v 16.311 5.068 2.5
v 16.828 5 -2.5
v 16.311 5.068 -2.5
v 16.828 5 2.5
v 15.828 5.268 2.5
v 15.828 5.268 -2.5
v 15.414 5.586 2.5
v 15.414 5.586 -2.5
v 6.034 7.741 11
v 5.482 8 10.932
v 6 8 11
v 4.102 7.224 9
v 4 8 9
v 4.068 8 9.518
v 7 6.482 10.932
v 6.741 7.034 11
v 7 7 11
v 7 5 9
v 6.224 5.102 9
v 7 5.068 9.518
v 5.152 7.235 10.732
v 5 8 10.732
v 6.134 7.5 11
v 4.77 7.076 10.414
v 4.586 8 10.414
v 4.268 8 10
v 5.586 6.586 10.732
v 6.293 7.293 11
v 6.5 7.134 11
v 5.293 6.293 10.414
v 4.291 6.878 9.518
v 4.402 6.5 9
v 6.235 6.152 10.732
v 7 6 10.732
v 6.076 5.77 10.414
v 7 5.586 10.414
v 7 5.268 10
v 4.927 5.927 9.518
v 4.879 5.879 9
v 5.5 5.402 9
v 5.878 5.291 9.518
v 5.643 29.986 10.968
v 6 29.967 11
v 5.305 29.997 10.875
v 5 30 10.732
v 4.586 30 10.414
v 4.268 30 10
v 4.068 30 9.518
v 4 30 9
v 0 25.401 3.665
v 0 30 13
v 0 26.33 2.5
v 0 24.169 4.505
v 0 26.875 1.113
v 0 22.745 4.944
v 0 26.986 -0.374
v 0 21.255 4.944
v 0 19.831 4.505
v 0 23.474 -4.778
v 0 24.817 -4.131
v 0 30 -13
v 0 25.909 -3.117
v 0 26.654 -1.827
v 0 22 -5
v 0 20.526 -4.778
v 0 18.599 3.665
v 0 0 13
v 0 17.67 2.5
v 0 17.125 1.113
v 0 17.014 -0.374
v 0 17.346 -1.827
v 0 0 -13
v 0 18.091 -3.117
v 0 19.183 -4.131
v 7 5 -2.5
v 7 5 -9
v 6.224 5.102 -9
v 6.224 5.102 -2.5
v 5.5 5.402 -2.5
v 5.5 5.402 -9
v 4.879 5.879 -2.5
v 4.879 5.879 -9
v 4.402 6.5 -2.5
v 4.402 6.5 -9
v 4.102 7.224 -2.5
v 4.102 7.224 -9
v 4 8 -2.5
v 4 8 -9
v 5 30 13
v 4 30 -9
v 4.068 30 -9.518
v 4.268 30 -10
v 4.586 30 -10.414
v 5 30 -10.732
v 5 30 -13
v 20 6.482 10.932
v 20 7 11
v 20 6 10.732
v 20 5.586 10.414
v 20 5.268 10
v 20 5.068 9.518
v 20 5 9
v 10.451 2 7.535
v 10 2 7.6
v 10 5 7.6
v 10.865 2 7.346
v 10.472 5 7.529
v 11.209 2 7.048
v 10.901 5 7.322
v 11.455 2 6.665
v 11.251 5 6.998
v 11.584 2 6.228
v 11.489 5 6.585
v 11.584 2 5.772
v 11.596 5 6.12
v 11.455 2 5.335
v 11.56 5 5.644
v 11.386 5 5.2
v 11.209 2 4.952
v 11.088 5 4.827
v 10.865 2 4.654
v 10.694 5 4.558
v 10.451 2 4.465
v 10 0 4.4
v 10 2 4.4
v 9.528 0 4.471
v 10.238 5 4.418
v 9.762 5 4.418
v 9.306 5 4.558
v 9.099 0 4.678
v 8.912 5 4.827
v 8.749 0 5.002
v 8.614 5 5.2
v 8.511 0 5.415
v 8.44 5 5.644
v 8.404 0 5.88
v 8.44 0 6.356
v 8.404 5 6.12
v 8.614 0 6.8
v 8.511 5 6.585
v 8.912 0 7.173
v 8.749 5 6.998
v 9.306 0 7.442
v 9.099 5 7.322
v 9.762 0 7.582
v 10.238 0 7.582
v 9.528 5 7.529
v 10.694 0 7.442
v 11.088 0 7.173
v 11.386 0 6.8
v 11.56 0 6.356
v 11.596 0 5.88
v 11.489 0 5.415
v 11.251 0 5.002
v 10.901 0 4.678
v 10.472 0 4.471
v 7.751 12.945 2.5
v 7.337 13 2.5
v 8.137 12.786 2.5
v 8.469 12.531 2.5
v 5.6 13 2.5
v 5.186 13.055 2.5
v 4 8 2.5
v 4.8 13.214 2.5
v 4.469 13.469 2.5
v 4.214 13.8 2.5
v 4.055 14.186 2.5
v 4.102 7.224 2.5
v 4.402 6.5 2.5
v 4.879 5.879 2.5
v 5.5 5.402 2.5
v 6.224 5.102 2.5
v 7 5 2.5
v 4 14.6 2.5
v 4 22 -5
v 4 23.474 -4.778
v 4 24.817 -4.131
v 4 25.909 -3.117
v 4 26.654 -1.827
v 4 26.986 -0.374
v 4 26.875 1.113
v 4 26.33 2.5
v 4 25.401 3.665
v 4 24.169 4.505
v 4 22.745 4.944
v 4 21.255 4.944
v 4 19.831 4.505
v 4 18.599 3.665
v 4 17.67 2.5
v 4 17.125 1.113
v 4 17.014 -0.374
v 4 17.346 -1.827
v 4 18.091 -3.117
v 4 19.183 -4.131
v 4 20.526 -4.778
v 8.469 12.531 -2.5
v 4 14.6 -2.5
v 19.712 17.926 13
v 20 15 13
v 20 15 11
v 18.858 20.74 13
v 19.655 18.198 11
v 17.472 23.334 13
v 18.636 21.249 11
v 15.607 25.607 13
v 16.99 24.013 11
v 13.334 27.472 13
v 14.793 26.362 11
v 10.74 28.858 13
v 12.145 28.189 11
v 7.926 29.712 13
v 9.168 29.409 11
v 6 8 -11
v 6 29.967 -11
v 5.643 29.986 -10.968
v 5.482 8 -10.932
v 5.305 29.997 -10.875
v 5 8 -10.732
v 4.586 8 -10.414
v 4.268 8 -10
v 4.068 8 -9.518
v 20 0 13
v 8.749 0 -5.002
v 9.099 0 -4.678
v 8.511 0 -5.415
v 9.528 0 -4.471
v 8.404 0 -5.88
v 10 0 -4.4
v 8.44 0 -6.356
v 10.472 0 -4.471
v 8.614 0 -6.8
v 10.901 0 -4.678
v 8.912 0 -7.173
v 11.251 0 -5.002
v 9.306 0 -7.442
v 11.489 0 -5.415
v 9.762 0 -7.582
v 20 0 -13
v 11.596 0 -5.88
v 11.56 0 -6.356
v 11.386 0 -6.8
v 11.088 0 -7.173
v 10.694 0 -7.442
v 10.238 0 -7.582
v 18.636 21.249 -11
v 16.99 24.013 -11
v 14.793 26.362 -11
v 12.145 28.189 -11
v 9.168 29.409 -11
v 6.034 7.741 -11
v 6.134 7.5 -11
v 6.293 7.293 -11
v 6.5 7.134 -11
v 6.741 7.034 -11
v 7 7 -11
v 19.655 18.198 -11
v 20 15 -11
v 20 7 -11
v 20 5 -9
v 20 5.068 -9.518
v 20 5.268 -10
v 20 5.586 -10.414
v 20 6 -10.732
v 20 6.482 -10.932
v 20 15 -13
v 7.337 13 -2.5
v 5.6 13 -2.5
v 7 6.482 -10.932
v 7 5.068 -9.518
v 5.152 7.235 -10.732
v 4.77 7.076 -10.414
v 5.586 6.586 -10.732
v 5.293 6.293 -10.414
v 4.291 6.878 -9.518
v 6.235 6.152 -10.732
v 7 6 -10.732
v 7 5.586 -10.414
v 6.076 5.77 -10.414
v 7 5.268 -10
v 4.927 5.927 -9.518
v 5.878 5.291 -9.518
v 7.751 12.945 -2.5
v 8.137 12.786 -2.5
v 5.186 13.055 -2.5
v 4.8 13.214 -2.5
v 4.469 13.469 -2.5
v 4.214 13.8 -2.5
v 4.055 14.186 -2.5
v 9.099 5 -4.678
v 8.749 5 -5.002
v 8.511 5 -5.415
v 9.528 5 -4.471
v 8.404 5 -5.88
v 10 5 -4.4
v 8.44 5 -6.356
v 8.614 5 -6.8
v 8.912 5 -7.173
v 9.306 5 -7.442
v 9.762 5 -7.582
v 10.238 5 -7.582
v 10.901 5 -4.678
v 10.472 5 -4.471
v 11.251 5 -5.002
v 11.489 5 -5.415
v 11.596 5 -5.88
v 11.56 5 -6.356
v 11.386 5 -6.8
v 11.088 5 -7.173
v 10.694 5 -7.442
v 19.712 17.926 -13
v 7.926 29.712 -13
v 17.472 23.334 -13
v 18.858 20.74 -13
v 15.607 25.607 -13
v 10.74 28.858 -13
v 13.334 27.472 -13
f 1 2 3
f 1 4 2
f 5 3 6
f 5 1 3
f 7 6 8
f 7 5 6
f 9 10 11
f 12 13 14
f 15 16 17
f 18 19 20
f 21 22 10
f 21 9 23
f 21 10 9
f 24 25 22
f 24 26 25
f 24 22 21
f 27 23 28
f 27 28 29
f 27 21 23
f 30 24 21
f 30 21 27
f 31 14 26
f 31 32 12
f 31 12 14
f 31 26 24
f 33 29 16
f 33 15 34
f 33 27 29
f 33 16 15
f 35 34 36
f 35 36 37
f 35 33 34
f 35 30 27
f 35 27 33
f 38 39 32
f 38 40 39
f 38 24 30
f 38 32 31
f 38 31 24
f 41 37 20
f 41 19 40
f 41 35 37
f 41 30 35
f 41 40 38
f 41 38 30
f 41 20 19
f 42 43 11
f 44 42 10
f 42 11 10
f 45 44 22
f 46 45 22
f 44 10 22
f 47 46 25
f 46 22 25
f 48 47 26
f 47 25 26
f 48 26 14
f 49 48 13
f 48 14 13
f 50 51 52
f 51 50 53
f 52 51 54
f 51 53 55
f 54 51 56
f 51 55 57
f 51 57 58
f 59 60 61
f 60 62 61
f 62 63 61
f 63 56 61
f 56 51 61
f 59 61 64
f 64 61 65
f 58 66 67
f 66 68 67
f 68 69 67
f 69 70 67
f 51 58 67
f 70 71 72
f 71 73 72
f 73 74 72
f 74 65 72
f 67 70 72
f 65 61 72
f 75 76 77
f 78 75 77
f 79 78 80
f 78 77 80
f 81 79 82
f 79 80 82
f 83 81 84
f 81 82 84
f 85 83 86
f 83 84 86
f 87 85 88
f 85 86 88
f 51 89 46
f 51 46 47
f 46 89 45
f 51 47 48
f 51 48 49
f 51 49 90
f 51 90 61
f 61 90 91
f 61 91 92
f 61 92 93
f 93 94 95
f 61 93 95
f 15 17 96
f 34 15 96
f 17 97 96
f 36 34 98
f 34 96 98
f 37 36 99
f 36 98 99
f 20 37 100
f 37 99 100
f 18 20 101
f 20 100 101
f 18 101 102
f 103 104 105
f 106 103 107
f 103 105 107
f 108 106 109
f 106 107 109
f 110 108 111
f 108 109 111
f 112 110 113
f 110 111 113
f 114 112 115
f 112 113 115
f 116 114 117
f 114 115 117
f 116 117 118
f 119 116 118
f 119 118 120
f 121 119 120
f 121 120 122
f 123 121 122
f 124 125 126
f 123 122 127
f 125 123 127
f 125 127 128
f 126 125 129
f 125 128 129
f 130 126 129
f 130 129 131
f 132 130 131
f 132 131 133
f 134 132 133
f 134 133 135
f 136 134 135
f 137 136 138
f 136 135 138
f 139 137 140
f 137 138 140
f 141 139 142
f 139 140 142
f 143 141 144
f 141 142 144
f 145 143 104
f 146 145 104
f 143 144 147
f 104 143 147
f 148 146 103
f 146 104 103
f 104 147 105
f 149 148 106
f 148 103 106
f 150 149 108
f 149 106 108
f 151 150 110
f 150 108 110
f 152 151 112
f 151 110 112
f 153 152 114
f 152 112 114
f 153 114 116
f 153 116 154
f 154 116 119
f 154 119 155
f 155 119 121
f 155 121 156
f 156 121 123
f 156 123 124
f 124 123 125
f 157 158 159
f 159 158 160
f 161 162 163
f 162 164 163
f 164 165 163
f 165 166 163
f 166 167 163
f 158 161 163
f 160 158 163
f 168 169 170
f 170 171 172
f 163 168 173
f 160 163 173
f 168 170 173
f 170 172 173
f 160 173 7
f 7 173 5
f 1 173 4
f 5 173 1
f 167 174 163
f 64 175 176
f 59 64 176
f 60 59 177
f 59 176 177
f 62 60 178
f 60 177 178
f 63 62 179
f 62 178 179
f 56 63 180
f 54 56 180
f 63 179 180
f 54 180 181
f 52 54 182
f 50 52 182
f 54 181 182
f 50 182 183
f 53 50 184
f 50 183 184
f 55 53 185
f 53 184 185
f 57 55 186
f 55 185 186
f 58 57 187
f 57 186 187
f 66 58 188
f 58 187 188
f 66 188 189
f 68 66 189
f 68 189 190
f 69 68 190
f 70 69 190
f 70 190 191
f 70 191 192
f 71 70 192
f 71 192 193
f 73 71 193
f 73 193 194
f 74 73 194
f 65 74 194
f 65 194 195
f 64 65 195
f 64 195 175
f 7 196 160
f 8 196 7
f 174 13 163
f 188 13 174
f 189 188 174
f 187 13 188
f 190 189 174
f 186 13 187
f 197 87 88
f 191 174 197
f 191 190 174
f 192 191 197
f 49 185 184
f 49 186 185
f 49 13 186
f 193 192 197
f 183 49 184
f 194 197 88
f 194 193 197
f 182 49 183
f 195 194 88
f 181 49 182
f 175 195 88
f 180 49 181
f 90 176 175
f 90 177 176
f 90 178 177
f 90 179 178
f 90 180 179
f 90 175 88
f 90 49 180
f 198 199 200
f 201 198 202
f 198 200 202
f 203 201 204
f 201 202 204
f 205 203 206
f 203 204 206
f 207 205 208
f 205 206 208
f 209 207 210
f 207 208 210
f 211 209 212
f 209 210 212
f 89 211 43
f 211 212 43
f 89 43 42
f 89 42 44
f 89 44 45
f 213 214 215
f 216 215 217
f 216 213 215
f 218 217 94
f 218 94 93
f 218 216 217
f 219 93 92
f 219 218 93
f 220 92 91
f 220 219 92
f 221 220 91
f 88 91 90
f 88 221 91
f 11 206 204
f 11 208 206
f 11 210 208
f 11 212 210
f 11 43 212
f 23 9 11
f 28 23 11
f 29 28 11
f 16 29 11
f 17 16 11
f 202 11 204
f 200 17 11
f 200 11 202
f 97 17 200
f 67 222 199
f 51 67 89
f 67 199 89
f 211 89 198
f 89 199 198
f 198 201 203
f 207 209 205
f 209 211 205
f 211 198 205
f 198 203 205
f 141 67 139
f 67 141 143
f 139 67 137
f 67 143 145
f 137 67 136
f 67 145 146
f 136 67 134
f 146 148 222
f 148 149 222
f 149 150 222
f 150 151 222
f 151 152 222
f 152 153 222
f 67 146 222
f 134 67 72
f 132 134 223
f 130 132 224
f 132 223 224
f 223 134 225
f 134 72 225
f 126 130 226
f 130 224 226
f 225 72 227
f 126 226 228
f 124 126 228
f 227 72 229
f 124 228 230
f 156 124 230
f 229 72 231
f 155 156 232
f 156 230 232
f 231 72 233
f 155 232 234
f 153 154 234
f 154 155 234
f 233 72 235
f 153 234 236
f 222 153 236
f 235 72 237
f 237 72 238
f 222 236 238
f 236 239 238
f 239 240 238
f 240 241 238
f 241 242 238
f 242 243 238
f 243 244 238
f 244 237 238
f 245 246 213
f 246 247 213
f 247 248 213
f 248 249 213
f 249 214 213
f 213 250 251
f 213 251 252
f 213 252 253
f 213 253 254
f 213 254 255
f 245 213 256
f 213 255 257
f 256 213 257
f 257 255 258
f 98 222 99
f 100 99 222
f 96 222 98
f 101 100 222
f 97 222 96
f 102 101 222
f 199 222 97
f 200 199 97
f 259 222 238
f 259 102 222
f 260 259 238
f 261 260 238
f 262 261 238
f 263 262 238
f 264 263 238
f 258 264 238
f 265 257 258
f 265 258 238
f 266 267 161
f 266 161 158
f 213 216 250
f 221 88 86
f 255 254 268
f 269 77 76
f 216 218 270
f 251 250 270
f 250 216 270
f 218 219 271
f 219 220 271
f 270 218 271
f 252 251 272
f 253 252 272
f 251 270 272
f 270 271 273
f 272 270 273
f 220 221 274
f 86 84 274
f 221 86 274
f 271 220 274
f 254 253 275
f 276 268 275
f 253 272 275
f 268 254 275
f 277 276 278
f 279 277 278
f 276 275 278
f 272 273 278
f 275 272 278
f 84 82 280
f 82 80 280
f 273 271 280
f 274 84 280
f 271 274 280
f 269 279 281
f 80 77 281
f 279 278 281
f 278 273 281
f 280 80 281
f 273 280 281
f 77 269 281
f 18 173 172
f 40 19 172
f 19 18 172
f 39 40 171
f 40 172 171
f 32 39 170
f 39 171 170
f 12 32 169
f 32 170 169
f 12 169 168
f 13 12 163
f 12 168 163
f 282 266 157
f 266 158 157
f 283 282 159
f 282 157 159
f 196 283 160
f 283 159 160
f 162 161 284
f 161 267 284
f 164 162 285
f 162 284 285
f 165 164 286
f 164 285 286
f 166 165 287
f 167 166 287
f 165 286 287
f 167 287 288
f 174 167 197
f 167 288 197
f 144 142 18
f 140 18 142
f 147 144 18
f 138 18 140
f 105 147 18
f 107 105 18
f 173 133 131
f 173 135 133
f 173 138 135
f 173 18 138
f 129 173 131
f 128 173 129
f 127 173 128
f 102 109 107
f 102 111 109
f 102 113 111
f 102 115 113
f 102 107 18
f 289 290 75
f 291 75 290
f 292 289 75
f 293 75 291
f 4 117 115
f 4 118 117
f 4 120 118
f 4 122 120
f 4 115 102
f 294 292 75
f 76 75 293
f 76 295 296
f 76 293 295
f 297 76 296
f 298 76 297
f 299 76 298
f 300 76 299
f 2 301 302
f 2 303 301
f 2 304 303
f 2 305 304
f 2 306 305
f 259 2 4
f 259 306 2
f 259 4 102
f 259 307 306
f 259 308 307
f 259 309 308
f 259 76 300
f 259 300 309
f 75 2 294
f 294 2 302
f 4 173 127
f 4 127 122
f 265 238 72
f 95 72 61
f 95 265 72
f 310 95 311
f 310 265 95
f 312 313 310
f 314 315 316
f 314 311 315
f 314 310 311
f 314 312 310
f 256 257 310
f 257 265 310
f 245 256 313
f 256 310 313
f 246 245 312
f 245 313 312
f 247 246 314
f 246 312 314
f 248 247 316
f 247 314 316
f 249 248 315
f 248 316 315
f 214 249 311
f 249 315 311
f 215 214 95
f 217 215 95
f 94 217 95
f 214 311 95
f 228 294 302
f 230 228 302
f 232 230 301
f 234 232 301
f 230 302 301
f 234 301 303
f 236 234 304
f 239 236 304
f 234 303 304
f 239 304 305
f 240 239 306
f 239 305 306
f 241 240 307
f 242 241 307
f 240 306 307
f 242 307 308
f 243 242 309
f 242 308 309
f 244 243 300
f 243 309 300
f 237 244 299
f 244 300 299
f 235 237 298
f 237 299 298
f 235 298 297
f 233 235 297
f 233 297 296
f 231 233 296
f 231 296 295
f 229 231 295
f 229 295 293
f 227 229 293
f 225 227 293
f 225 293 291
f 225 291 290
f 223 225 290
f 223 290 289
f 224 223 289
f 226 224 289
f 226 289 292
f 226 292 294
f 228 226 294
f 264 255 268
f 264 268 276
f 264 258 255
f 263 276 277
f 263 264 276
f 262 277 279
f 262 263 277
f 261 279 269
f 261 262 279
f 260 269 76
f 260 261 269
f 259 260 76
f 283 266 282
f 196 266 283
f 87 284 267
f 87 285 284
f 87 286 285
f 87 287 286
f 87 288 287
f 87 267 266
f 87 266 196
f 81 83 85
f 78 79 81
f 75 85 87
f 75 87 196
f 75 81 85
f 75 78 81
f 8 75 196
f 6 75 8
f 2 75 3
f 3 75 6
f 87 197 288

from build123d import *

# Parameters (mm, degrees)
EXTRUDE_1_DEPTH      = 13
EXTRUDE_1_DEPTH_BACK = 13
SKETCH_2_R           = 5
CUT_EXTRUDE_1_DEPTH  = 38.322915213
SKETCH_3_R           = 1.6
CUT_EXTRUDE_2_DEPTH  = 37.783148315
EXTRUDE_START        = 3
SKETCH_4_W           = 18
SKETCH_4_H           = 26
SKETCH_4_R           = 1.6
EXTRUDE_2_DEPTH      = 3
EXTRUDE_START_2      = 2
SKETCH_5_W           = 26
SKETCH_5_H           = 25
SKETCH_5_R           = 5
EXTRUDE_3_DEPTH      = 2
SKETCH_6_W           = 14
SKETCH_6_H           = 5
EXTRUDE_4_DEPTH      = 8
CHAMFER_1_SIZE       = 10
FILLET_1_R           = 3
EXTRUDE_5_REACH      = 36.554
SKETCH_7_W           = 16
SKETCH_7_H           = 2
FILLET_2_R           = 15
FILLET_3_R           = 2
FILLET_4_R           = 1.6


with BuildPart() as part:
    # 草图1 → 凸台-拉伸1 (new, two sides: drawn at the far end of the back side and taken through both)
    with BuildSketch(Plane.XY.offset(-EXTRUDE_1_DEPTH_BACK)):
        Polygon((0, 30), (0, 0), (20, 0), (20, 2), (2, 2), (2, 30), align=None)
    extrude(amount=EXTRUDE_1_DEPTH + EXTRUDE_1_DEPTH_BACK)

    # 草图2 → 切除-拉伸1 (cut, through all)
    with BuildSketch(Plane(origin=(2, 0, 0), x_dir=(0, 0, -1), z_dir=(1, 0, 0))):
        with Locations((0, 22)):
            Circle(SKETCH_2_R)
    extrude(amount=-CUT_EXTRUDE_1_DEPTH, mode=Mode.SUBTRACT)

    # 草图3 → 切除-拉伸2 (cut, through all)
    with BuildSketch(Plane(origin=(0, 2, 0), x_dir=(1, 0, 0), z_dir=(0, 1, 0))):
        with Locations(Location((10, 6, 0), (0, 0, 270))):
            Circle(SKETCH_3_R)
        with Locations(Location((10, -6, 0), (0, 0, 90))):
            Circle(SKETCH_3_R)
    extrude(amount=-CUT_EXTRUDE_2_DEPTH, mode=Mode.SUBTRACT)

    # 草图4 → 凸台-拉伸2 (add)
    with BuildSketch(Plane(origin=(0, 2, 0), x_dir=(1, 0, 0), z_dir=(0, 1, 0)).offset(EXTRUDE_START)):
        with Locations((11, 0)):
            Rectangle(SKETCH_4_W, SKETCH_4_H)
        with Locations(Location((10, -6, 0), (0, 0, 270))):
            Circle(SKETCH_4_R, mode=Mode.SUBTRACT)
        with Locations(Location((10, 6, 0), (0, 0, 270))):
            Circle(SKETCH_4_R, mode=Mode.SUBTRACT)
    extrude(amount=-EXTRUDE_2_DEPTH)

    # 草图5 → 凸台-拉伸3 (add)
    with BuildSketch(Plane(origin=(2, 0, 0), x_dir=(0, 0, -1), z_dir=(1, 0, 0)).offset(EXTRUDE_START_2)):
        with Locations((0, 17.5)):
            Rectangle(SKETCH_5_W, SKETCH_5_H)
        with Locations((0, 22)):
            Circle(SKETCH_5_R, mode=Mode.SUBTRACT)
    extrude(amount=-EXTRUDE_3_DEPTH)

    # 草图6 → 凸台-拉伸4 (add)
    with BuildSketch(Plane(origin=(0, 5, 0), x_dir=(1, 0, 0), z_dir=(0, 1, 0))):
        with Locations((11, 0)):
            Rectangle(SKETCH_6_W, SKETCH_6_H)
    extrude(amount=EXTRUDE_4_DEPTH)

    # 倒角1
    # the kernel refuses this chamfer: 10 mm, written as the material it takes off along each edge
    with BuildSketch(Plane(origin=(18, 13, -28.21682988), x_dir=(-0.9996219169112968, 0.027495876610586317, 0), z_dir=(0, 0, 1))) as chamfer_1_piece_1_section:
        Polygon((CHAMFER_1_SIZE * 0.999621916911, CHAMFER_1_SIZE * 0.0274958766106), (-CHAMFER_1_SIZE * 0.0274958766106, CHAMFER_1_SIZE * 0.999621916911), (0, 0), align=None)
    chamfer_1_piece_1 = extrude(amount=56.433659759, mode=Mode.PRIVATE)
    chamfer_1_piece_1 = split(chamfer_1_piece_1, bisect_by=Plane(origin=(14.542815877, 5, 0), z_dir=(0, 1, 0)), keep=Keep.TOP, mode=Mode.PRIVATE)
    add(chamfer_1_piece_1, mode=Mode.SUBTRACT)

    # 圆角1
    fillet_1_edges = [part.edges().sort_by_distance(p)[0] for p in [
        (4, 5, 7.75),
        (4, 5, -7.75),
    ]]
    fillet(fillet_1_edges, radius=FILLET_1_R)

    # 凸台-拉伸5: up to this face of the body (flat: up to its plane)
    extrude_5_end = Plane(part.part.faces().sort_by_distance((2, 30, 0))[0])
    # 草图7 → 凸台-拉伸5 (add, up to the picked face)
    with BuildSketch(Plane(origin=(0, 5, 0), x_dir=(1, 0, 0), z_dir=(0, 1, 0)), mode=Mode.PRIVATE) as extrude_5_sk1:
        with Locations((12, 12)):
            Rectangle(SKETCH_7_W, SKETCH_7_H)
    extrude_5_tool1 = split(extrude(extrude_5_sk1.sketch, amount=EXTRUDE_5_REACH, mode=Mode.PRIVATE), bisect_by=extrude_5_end, keep=Keep.BOTH, mode=Mode.PRIVATE)
    # 草图7 → 凸台-拉伸5 (add, up to the picked face)
    with BuildSketch(Plane(origin=(0, 5, 0), x_dir=(1, 0, 0), z_dir=(0, 1, 0)), mode=Mode.PRIVATE) as extrude_5_sk2:
        with Locations((12, -12)):
            Rectangle(SKETCH_7_W, SKETCH_7_H)
    extrude_5_tool2 = split(extrude(extrude_5_sk2.sketch, amount=EXTRUDE_5_REACH, mode=Mode.PRIVATE), bisect_by=extrude_5_end, keep=Keep.BOTH, mode=Mode.PRIVATE)
    add(extrude_5_tool1.solids().sort_by(Axis((12, 5, -12), (0, 1, 0)))[0])
    add(extrude_5_tool2.solids().sort_by(Axis((12, 5, 12), (0, 1, 0)))[0])

    # 圆角2
    fillet_2_edges = [part.edges().sort_by_distance(p)[0] for p in [
        (20, 30, -12),
        (20, 30, 12),
    ]]
    fillet(fillet_2_edges, radius=FILLET_2_R)

    # 圆角3
    fillet_3_edges = [part.edges().sort_by_distance(p)[0] for p in [
        (13.5, 5, 11),
        (4.878679656, 5.878679656, 11),
        (13.5, 5, -11),
        (4.878679656, 5.878679656, -11),
        (16, 5, 0),
        (4, 19, 11),
        (4, 19, -11),
    ]]
    fillet(fillet_3_edges, radius=FILLET_3_R)

    # 圆角4
    fillet_4_edges = [part.edges().sort_by_distance(p)[0] for p in [
        (4, 13, 0),
        (8, 13, 0),
    ]]
    fillet(fillet_4_edges, radius=FILLET_4_R)


solid = part.part
